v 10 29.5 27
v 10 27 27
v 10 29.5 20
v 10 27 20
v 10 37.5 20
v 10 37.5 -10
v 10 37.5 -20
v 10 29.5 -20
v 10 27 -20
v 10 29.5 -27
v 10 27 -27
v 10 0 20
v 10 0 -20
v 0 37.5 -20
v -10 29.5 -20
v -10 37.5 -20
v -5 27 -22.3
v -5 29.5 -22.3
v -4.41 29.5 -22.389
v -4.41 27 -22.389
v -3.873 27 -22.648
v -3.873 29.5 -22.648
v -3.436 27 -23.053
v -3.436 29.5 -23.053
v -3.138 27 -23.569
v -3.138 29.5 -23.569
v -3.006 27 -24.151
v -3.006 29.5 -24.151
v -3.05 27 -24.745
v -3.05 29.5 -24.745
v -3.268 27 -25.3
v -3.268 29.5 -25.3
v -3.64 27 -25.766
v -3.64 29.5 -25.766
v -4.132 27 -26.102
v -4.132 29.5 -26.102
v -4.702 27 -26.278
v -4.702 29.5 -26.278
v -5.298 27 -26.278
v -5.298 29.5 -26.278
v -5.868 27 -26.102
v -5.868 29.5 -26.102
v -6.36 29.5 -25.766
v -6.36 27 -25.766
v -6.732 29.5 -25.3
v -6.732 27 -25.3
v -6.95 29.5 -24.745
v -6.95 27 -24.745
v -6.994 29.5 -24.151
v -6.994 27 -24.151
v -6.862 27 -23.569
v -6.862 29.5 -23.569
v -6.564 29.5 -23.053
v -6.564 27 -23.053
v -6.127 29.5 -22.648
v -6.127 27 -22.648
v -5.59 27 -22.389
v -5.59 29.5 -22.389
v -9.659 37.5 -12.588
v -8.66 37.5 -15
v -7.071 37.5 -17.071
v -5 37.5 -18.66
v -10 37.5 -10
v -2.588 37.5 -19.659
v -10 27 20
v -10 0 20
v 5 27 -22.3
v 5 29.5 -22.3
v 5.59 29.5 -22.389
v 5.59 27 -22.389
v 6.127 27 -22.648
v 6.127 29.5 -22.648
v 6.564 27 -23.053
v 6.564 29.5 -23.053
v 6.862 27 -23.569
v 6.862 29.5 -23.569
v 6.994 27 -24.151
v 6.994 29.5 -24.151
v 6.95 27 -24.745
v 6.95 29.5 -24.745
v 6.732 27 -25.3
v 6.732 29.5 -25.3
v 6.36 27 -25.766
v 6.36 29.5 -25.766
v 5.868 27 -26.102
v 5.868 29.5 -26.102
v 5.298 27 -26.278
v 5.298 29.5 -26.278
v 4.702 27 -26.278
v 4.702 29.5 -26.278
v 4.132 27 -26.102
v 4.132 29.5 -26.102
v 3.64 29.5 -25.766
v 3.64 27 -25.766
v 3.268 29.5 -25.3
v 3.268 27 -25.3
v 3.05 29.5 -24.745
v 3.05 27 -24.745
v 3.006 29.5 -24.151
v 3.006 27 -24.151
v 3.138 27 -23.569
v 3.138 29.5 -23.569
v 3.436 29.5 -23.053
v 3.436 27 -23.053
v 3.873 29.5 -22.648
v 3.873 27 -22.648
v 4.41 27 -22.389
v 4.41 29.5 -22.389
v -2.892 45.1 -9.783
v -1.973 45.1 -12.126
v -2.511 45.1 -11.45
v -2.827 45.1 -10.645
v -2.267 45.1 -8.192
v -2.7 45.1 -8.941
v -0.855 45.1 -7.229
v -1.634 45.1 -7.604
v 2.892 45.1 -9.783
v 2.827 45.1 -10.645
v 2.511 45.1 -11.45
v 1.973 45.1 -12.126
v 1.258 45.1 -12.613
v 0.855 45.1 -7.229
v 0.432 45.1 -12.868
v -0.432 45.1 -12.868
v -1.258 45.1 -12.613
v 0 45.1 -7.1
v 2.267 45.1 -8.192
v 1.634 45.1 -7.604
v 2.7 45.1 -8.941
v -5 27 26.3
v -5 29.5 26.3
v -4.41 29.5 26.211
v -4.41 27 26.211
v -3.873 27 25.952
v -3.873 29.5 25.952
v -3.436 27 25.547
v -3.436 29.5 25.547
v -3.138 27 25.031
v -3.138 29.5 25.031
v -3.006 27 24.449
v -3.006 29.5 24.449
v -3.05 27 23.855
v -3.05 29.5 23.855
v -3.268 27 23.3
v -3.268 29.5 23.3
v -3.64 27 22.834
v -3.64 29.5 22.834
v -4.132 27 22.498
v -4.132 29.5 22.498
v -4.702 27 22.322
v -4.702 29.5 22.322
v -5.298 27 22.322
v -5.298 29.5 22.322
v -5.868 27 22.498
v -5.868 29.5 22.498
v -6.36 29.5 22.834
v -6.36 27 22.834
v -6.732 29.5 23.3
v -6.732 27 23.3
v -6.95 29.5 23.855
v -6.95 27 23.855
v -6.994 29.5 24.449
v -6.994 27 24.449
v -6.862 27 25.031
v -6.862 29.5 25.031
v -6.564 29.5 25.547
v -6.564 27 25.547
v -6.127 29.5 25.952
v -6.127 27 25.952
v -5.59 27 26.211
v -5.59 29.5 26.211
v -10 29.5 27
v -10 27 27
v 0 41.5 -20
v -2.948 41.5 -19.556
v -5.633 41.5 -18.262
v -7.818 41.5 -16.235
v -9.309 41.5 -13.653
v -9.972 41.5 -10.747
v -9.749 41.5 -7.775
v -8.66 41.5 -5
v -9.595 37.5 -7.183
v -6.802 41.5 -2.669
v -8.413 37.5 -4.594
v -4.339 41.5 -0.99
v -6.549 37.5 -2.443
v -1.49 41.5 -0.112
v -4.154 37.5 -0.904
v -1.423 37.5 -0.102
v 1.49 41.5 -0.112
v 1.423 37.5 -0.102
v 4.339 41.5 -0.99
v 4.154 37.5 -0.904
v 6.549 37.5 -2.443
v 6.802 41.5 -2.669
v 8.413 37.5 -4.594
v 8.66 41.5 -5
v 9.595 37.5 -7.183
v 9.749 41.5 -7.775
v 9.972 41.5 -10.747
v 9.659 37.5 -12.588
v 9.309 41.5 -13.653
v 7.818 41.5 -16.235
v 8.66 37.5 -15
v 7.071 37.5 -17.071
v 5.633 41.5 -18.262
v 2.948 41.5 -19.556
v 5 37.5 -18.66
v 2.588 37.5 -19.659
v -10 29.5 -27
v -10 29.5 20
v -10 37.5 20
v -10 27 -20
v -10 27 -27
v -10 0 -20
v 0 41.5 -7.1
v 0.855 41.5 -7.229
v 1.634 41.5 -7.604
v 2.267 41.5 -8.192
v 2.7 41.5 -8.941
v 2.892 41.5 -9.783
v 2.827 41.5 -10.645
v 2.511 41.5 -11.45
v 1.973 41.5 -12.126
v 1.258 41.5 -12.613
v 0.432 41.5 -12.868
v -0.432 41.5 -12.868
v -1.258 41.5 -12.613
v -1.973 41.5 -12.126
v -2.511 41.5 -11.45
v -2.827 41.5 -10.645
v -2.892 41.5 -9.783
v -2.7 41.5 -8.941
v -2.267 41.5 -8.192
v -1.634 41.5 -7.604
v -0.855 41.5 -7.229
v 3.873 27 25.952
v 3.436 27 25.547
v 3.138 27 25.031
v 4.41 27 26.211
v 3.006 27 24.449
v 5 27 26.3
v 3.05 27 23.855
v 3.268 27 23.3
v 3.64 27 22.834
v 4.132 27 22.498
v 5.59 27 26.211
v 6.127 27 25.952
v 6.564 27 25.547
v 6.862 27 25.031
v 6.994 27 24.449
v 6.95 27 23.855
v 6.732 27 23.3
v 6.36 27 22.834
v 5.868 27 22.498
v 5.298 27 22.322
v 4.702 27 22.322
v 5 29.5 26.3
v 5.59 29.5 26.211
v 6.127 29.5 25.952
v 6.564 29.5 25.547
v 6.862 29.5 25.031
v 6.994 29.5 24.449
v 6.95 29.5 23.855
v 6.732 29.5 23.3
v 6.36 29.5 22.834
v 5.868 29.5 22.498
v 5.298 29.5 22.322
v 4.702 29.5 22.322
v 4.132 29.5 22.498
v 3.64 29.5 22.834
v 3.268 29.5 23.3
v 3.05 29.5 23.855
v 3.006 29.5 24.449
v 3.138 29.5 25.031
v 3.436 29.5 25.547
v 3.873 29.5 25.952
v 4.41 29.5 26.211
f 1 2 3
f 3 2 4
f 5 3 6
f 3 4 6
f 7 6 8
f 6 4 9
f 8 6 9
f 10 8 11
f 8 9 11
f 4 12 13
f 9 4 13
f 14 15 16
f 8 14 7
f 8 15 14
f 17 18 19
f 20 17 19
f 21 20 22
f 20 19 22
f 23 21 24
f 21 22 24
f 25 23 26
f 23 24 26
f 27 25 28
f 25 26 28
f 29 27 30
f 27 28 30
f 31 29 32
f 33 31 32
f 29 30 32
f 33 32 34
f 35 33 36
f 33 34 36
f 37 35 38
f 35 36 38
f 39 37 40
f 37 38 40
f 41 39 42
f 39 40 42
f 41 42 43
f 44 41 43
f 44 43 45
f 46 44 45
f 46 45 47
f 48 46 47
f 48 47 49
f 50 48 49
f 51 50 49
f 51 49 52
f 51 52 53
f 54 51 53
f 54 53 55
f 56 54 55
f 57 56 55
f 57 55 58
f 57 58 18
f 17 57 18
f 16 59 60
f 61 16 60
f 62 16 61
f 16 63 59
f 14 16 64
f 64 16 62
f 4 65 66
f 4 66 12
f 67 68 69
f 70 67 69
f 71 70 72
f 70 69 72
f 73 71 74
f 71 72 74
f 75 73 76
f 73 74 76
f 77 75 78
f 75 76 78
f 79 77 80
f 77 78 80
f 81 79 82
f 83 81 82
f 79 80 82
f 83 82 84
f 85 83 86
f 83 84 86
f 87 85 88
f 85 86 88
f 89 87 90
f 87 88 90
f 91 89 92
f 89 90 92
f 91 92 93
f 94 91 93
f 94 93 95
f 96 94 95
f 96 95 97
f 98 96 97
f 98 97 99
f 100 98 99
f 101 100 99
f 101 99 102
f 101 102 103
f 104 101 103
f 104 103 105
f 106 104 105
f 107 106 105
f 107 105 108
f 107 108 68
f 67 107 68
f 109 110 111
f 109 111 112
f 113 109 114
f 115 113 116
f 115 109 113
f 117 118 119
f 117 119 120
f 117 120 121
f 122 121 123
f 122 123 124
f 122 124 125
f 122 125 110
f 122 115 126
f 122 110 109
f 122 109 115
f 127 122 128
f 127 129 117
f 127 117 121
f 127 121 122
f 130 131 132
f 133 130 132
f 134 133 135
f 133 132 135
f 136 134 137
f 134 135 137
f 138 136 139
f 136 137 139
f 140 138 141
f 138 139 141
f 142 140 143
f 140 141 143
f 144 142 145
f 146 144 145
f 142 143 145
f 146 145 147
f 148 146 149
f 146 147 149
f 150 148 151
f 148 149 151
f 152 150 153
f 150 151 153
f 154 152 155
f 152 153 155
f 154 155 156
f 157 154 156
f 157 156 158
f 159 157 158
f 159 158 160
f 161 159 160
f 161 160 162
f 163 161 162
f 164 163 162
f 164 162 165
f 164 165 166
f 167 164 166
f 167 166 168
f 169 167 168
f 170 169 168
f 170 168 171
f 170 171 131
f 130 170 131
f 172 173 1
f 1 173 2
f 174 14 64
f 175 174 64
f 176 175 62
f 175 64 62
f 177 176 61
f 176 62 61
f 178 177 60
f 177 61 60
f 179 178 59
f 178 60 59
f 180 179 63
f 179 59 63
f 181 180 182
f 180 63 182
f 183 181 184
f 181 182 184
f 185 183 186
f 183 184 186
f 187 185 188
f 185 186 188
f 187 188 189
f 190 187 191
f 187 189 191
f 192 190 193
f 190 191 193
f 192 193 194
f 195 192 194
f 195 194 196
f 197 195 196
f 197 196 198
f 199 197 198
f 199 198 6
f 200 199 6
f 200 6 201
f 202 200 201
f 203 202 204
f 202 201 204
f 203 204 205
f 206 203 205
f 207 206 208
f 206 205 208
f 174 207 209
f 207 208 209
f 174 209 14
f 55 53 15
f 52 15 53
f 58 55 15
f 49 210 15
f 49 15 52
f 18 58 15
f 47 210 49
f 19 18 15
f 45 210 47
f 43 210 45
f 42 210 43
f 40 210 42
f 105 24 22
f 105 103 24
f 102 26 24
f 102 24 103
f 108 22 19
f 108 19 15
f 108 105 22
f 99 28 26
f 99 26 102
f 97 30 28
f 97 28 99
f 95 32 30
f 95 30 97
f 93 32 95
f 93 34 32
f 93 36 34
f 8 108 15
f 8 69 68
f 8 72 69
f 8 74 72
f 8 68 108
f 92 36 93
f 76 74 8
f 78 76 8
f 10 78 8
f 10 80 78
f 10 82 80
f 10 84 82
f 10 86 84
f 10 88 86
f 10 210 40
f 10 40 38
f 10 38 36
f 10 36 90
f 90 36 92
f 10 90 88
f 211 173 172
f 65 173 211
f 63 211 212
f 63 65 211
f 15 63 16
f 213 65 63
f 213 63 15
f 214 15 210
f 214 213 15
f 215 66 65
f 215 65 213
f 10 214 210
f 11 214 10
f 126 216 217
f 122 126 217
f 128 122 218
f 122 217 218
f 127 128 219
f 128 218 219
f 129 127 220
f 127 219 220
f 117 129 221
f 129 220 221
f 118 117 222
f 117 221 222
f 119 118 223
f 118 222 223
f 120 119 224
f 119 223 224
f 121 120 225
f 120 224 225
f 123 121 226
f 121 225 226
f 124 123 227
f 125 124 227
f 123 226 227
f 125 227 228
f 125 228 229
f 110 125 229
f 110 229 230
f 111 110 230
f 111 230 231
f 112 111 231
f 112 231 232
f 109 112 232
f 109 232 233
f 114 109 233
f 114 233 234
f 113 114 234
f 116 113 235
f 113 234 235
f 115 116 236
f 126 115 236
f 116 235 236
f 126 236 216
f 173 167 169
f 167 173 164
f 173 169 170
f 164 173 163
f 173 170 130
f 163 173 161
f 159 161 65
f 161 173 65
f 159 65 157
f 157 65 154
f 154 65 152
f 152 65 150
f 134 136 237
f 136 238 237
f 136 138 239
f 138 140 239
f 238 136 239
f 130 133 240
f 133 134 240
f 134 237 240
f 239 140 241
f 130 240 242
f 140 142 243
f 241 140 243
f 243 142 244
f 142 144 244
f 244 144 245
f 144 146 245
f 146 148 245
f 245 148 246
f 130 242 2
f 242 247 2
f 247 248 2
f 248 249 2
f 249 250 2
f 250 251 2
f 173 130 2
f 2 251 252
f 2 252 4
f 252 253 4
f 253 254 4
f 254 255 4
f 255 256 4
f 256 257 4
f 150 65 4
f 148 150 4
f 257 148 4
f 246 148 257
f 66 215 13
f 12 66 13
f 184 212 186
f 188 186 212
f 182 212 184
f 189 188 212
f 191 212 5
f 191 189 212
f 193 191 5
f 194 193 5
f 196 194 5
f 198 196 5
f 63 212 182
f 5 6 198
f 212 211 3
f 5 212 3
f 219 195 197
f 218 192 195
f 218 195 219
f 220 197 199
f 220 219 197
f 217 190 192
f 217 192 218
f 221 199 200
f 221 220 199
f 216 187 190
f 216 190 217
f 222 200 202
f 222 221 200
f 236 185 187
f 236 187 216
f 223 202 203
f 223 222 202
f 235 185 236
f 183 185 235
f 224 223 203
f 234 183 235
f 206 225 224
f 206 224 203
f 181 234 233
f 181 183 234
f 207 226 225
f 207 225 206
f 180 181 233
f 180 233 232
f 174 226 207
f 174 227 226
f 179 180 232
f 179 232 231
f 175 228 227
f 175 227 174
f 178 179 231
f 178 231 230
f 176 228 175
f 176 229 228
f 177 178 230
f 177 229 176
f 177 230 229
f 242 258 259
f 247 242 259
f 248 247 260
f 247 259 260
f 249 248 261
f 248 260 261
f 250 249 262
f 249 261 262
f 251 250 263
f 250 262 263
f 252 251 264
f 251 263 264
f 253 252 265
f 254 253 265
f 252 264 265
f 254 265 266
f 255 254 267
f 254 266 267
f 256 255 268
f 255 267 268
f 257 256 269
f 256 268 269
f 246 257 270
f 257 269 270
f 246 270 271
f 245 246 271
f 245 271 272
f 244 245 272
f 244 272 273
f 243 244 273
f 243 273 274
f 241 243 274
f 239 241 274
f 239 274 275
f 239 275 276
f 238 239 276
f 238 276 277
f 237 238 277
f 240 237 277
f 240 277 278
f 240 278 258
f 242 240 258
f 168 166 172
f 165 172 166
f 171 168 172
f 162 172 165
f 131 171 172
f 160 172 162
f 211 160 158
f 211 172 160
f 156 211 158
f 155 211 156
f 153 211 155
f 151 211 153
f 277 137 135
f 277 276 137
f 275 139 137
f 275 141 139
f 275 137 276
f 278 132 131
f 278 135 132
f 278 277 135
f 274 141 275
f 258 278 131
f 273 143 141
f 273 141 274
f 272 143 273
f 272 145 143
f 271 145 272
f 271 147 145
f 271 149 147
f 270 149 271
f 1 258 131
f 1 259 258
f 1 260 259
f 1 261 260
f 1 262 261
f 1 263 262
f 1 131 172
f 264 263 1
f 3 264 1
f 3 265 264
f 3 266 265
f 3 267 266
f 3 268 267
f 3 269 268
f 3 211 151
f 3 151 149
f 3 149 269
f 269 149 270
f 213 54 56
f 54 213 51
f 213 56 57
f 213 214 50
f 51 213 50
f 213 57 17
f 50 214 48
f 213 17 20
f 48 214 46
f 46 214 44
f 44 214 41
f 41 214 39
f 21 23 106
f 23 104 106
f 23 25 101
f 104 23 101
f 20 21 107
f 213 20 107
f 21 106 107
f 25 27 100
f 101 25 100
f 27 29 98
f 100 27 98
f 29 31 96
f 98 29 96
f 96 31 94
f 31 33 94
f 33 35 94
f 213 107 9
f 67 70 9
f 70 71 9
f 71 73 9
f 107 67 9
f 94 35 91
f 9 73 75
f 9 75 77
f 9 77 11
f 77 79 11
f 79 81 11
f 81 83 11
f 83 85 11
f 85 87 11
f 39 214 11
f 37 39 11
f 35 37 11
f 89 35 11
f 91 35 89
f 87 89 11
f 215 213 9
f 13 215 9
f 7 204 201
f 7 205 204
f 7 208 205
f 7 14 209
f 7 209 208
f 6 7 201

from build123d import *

# Parameters (mm, degrees)
SKETCH_1_W          = 20
SKETCH_1_H          = 40
EXTRUDE_1_DEPTH     = 27
SKETCH_2_W          = 20
SKETCH_2_H          = 54
EXTRUDE_2_DEPTH     = 2.5
SKETCH_3_W          = 20
SKETCH_3_H          = 40
EXTRUDE_3_DEPTH     = 8
SKETCH_4_R          = 2
CUT_EXTRUDE_1_DEPTH = 42.221960167
SKETCH_5_R          = 10
EXTRUDE_4_DEPTH     = 4
SKETCH_6_R          = 2.9
EXTRUDE_5_DEPTH     = 3.6


with BuildPart() as part:
    # 草图1 → 凸台-拉伸1 (new body)
    with BuildSketch(Plane(origin=(0, 0, 0), x_dir=(1, 0, 0), z_dir=(0, 1, 0))):
        Rectangle(SKETCH_1_W, SKETCH_1_H)
    extrude(amount=EXTRUDE_1_DEPTH)

    # 草图2 → 凸台-拉伸2 (add)
    with BuildSketch(Plane(origin=(0, 27, 0), x_dir=(1, 0, 0), z_dir=(0, 1, 0))):
        Rectangle(SKETCH_2_W, SKETCH_2_H)
    extrude(amount=EXTRUDE_2_DEPTH)

    # 草图3 → 凸台-拉伸3 (add)
    with BuildSketch(Plane(origin=(0, 29.5, 0), x_dir=(1, 0, 0), z_dir=(0, 1, 0))):
        Rectangle(SKETCH_3_W, SKETCH_3_H)
    extrude(amount=EXTRUDE_3_DEPTH)

    # 草图4 → 切除-拉伸1 (cut, through all)
    with BuildSketch(Plane(origin=(0, 29.5, 0), x_dir=(1, 0, 0), z_dir=(0, 1, 0))):
        with Locations(Location((-5, -24.3, 0), (0, 0, 270))):
            Circle(SKETCH_4_R)
        with Locations(Location((5, -24.3, 0), (0, 0, 270))):
            Circle(SKETCH_4_R)
        with Locations(Location((-5, 24.3, 0), (0, 0, 270))):
            Circle(SKETCH_4_R)
        with Locations(Location((5, 24.3, 0), (0, 0, 270))):
            Circle(SKETCH_4_R)
    extrude(amount=-CUT_EXTRUDE_1_DEPTH, mode=Mode.SUBTRACT)

    # 草图5 → 凸台-拉伸4 (add)
    with BuildSketch(Plane(origin=(0, 37.5, 0), x_dir=(1, 0, 0), z_dir=(0, 1, 0))):
        with Locations(Location((0, 10, 0), (0, 0, 90))):
            Circle(SKETCH_5_R)
    extrude(amount=EXTRUDE_4_DEPTH)

    # 草图6 → 凸台-拉伸5 (add)
    with BuildSketch(Plane(origin=(0, 41.5, 0), x_dir=(1, 0, 0), z_dir=(0, 1, 0))):
        with Locations(Location((0, 10, 0), (0, 0, 270))):
            Circle(SKETCH_6_R)
    extrude(amount=EXTRUDE_5_DEPTH)


solid = part.part
